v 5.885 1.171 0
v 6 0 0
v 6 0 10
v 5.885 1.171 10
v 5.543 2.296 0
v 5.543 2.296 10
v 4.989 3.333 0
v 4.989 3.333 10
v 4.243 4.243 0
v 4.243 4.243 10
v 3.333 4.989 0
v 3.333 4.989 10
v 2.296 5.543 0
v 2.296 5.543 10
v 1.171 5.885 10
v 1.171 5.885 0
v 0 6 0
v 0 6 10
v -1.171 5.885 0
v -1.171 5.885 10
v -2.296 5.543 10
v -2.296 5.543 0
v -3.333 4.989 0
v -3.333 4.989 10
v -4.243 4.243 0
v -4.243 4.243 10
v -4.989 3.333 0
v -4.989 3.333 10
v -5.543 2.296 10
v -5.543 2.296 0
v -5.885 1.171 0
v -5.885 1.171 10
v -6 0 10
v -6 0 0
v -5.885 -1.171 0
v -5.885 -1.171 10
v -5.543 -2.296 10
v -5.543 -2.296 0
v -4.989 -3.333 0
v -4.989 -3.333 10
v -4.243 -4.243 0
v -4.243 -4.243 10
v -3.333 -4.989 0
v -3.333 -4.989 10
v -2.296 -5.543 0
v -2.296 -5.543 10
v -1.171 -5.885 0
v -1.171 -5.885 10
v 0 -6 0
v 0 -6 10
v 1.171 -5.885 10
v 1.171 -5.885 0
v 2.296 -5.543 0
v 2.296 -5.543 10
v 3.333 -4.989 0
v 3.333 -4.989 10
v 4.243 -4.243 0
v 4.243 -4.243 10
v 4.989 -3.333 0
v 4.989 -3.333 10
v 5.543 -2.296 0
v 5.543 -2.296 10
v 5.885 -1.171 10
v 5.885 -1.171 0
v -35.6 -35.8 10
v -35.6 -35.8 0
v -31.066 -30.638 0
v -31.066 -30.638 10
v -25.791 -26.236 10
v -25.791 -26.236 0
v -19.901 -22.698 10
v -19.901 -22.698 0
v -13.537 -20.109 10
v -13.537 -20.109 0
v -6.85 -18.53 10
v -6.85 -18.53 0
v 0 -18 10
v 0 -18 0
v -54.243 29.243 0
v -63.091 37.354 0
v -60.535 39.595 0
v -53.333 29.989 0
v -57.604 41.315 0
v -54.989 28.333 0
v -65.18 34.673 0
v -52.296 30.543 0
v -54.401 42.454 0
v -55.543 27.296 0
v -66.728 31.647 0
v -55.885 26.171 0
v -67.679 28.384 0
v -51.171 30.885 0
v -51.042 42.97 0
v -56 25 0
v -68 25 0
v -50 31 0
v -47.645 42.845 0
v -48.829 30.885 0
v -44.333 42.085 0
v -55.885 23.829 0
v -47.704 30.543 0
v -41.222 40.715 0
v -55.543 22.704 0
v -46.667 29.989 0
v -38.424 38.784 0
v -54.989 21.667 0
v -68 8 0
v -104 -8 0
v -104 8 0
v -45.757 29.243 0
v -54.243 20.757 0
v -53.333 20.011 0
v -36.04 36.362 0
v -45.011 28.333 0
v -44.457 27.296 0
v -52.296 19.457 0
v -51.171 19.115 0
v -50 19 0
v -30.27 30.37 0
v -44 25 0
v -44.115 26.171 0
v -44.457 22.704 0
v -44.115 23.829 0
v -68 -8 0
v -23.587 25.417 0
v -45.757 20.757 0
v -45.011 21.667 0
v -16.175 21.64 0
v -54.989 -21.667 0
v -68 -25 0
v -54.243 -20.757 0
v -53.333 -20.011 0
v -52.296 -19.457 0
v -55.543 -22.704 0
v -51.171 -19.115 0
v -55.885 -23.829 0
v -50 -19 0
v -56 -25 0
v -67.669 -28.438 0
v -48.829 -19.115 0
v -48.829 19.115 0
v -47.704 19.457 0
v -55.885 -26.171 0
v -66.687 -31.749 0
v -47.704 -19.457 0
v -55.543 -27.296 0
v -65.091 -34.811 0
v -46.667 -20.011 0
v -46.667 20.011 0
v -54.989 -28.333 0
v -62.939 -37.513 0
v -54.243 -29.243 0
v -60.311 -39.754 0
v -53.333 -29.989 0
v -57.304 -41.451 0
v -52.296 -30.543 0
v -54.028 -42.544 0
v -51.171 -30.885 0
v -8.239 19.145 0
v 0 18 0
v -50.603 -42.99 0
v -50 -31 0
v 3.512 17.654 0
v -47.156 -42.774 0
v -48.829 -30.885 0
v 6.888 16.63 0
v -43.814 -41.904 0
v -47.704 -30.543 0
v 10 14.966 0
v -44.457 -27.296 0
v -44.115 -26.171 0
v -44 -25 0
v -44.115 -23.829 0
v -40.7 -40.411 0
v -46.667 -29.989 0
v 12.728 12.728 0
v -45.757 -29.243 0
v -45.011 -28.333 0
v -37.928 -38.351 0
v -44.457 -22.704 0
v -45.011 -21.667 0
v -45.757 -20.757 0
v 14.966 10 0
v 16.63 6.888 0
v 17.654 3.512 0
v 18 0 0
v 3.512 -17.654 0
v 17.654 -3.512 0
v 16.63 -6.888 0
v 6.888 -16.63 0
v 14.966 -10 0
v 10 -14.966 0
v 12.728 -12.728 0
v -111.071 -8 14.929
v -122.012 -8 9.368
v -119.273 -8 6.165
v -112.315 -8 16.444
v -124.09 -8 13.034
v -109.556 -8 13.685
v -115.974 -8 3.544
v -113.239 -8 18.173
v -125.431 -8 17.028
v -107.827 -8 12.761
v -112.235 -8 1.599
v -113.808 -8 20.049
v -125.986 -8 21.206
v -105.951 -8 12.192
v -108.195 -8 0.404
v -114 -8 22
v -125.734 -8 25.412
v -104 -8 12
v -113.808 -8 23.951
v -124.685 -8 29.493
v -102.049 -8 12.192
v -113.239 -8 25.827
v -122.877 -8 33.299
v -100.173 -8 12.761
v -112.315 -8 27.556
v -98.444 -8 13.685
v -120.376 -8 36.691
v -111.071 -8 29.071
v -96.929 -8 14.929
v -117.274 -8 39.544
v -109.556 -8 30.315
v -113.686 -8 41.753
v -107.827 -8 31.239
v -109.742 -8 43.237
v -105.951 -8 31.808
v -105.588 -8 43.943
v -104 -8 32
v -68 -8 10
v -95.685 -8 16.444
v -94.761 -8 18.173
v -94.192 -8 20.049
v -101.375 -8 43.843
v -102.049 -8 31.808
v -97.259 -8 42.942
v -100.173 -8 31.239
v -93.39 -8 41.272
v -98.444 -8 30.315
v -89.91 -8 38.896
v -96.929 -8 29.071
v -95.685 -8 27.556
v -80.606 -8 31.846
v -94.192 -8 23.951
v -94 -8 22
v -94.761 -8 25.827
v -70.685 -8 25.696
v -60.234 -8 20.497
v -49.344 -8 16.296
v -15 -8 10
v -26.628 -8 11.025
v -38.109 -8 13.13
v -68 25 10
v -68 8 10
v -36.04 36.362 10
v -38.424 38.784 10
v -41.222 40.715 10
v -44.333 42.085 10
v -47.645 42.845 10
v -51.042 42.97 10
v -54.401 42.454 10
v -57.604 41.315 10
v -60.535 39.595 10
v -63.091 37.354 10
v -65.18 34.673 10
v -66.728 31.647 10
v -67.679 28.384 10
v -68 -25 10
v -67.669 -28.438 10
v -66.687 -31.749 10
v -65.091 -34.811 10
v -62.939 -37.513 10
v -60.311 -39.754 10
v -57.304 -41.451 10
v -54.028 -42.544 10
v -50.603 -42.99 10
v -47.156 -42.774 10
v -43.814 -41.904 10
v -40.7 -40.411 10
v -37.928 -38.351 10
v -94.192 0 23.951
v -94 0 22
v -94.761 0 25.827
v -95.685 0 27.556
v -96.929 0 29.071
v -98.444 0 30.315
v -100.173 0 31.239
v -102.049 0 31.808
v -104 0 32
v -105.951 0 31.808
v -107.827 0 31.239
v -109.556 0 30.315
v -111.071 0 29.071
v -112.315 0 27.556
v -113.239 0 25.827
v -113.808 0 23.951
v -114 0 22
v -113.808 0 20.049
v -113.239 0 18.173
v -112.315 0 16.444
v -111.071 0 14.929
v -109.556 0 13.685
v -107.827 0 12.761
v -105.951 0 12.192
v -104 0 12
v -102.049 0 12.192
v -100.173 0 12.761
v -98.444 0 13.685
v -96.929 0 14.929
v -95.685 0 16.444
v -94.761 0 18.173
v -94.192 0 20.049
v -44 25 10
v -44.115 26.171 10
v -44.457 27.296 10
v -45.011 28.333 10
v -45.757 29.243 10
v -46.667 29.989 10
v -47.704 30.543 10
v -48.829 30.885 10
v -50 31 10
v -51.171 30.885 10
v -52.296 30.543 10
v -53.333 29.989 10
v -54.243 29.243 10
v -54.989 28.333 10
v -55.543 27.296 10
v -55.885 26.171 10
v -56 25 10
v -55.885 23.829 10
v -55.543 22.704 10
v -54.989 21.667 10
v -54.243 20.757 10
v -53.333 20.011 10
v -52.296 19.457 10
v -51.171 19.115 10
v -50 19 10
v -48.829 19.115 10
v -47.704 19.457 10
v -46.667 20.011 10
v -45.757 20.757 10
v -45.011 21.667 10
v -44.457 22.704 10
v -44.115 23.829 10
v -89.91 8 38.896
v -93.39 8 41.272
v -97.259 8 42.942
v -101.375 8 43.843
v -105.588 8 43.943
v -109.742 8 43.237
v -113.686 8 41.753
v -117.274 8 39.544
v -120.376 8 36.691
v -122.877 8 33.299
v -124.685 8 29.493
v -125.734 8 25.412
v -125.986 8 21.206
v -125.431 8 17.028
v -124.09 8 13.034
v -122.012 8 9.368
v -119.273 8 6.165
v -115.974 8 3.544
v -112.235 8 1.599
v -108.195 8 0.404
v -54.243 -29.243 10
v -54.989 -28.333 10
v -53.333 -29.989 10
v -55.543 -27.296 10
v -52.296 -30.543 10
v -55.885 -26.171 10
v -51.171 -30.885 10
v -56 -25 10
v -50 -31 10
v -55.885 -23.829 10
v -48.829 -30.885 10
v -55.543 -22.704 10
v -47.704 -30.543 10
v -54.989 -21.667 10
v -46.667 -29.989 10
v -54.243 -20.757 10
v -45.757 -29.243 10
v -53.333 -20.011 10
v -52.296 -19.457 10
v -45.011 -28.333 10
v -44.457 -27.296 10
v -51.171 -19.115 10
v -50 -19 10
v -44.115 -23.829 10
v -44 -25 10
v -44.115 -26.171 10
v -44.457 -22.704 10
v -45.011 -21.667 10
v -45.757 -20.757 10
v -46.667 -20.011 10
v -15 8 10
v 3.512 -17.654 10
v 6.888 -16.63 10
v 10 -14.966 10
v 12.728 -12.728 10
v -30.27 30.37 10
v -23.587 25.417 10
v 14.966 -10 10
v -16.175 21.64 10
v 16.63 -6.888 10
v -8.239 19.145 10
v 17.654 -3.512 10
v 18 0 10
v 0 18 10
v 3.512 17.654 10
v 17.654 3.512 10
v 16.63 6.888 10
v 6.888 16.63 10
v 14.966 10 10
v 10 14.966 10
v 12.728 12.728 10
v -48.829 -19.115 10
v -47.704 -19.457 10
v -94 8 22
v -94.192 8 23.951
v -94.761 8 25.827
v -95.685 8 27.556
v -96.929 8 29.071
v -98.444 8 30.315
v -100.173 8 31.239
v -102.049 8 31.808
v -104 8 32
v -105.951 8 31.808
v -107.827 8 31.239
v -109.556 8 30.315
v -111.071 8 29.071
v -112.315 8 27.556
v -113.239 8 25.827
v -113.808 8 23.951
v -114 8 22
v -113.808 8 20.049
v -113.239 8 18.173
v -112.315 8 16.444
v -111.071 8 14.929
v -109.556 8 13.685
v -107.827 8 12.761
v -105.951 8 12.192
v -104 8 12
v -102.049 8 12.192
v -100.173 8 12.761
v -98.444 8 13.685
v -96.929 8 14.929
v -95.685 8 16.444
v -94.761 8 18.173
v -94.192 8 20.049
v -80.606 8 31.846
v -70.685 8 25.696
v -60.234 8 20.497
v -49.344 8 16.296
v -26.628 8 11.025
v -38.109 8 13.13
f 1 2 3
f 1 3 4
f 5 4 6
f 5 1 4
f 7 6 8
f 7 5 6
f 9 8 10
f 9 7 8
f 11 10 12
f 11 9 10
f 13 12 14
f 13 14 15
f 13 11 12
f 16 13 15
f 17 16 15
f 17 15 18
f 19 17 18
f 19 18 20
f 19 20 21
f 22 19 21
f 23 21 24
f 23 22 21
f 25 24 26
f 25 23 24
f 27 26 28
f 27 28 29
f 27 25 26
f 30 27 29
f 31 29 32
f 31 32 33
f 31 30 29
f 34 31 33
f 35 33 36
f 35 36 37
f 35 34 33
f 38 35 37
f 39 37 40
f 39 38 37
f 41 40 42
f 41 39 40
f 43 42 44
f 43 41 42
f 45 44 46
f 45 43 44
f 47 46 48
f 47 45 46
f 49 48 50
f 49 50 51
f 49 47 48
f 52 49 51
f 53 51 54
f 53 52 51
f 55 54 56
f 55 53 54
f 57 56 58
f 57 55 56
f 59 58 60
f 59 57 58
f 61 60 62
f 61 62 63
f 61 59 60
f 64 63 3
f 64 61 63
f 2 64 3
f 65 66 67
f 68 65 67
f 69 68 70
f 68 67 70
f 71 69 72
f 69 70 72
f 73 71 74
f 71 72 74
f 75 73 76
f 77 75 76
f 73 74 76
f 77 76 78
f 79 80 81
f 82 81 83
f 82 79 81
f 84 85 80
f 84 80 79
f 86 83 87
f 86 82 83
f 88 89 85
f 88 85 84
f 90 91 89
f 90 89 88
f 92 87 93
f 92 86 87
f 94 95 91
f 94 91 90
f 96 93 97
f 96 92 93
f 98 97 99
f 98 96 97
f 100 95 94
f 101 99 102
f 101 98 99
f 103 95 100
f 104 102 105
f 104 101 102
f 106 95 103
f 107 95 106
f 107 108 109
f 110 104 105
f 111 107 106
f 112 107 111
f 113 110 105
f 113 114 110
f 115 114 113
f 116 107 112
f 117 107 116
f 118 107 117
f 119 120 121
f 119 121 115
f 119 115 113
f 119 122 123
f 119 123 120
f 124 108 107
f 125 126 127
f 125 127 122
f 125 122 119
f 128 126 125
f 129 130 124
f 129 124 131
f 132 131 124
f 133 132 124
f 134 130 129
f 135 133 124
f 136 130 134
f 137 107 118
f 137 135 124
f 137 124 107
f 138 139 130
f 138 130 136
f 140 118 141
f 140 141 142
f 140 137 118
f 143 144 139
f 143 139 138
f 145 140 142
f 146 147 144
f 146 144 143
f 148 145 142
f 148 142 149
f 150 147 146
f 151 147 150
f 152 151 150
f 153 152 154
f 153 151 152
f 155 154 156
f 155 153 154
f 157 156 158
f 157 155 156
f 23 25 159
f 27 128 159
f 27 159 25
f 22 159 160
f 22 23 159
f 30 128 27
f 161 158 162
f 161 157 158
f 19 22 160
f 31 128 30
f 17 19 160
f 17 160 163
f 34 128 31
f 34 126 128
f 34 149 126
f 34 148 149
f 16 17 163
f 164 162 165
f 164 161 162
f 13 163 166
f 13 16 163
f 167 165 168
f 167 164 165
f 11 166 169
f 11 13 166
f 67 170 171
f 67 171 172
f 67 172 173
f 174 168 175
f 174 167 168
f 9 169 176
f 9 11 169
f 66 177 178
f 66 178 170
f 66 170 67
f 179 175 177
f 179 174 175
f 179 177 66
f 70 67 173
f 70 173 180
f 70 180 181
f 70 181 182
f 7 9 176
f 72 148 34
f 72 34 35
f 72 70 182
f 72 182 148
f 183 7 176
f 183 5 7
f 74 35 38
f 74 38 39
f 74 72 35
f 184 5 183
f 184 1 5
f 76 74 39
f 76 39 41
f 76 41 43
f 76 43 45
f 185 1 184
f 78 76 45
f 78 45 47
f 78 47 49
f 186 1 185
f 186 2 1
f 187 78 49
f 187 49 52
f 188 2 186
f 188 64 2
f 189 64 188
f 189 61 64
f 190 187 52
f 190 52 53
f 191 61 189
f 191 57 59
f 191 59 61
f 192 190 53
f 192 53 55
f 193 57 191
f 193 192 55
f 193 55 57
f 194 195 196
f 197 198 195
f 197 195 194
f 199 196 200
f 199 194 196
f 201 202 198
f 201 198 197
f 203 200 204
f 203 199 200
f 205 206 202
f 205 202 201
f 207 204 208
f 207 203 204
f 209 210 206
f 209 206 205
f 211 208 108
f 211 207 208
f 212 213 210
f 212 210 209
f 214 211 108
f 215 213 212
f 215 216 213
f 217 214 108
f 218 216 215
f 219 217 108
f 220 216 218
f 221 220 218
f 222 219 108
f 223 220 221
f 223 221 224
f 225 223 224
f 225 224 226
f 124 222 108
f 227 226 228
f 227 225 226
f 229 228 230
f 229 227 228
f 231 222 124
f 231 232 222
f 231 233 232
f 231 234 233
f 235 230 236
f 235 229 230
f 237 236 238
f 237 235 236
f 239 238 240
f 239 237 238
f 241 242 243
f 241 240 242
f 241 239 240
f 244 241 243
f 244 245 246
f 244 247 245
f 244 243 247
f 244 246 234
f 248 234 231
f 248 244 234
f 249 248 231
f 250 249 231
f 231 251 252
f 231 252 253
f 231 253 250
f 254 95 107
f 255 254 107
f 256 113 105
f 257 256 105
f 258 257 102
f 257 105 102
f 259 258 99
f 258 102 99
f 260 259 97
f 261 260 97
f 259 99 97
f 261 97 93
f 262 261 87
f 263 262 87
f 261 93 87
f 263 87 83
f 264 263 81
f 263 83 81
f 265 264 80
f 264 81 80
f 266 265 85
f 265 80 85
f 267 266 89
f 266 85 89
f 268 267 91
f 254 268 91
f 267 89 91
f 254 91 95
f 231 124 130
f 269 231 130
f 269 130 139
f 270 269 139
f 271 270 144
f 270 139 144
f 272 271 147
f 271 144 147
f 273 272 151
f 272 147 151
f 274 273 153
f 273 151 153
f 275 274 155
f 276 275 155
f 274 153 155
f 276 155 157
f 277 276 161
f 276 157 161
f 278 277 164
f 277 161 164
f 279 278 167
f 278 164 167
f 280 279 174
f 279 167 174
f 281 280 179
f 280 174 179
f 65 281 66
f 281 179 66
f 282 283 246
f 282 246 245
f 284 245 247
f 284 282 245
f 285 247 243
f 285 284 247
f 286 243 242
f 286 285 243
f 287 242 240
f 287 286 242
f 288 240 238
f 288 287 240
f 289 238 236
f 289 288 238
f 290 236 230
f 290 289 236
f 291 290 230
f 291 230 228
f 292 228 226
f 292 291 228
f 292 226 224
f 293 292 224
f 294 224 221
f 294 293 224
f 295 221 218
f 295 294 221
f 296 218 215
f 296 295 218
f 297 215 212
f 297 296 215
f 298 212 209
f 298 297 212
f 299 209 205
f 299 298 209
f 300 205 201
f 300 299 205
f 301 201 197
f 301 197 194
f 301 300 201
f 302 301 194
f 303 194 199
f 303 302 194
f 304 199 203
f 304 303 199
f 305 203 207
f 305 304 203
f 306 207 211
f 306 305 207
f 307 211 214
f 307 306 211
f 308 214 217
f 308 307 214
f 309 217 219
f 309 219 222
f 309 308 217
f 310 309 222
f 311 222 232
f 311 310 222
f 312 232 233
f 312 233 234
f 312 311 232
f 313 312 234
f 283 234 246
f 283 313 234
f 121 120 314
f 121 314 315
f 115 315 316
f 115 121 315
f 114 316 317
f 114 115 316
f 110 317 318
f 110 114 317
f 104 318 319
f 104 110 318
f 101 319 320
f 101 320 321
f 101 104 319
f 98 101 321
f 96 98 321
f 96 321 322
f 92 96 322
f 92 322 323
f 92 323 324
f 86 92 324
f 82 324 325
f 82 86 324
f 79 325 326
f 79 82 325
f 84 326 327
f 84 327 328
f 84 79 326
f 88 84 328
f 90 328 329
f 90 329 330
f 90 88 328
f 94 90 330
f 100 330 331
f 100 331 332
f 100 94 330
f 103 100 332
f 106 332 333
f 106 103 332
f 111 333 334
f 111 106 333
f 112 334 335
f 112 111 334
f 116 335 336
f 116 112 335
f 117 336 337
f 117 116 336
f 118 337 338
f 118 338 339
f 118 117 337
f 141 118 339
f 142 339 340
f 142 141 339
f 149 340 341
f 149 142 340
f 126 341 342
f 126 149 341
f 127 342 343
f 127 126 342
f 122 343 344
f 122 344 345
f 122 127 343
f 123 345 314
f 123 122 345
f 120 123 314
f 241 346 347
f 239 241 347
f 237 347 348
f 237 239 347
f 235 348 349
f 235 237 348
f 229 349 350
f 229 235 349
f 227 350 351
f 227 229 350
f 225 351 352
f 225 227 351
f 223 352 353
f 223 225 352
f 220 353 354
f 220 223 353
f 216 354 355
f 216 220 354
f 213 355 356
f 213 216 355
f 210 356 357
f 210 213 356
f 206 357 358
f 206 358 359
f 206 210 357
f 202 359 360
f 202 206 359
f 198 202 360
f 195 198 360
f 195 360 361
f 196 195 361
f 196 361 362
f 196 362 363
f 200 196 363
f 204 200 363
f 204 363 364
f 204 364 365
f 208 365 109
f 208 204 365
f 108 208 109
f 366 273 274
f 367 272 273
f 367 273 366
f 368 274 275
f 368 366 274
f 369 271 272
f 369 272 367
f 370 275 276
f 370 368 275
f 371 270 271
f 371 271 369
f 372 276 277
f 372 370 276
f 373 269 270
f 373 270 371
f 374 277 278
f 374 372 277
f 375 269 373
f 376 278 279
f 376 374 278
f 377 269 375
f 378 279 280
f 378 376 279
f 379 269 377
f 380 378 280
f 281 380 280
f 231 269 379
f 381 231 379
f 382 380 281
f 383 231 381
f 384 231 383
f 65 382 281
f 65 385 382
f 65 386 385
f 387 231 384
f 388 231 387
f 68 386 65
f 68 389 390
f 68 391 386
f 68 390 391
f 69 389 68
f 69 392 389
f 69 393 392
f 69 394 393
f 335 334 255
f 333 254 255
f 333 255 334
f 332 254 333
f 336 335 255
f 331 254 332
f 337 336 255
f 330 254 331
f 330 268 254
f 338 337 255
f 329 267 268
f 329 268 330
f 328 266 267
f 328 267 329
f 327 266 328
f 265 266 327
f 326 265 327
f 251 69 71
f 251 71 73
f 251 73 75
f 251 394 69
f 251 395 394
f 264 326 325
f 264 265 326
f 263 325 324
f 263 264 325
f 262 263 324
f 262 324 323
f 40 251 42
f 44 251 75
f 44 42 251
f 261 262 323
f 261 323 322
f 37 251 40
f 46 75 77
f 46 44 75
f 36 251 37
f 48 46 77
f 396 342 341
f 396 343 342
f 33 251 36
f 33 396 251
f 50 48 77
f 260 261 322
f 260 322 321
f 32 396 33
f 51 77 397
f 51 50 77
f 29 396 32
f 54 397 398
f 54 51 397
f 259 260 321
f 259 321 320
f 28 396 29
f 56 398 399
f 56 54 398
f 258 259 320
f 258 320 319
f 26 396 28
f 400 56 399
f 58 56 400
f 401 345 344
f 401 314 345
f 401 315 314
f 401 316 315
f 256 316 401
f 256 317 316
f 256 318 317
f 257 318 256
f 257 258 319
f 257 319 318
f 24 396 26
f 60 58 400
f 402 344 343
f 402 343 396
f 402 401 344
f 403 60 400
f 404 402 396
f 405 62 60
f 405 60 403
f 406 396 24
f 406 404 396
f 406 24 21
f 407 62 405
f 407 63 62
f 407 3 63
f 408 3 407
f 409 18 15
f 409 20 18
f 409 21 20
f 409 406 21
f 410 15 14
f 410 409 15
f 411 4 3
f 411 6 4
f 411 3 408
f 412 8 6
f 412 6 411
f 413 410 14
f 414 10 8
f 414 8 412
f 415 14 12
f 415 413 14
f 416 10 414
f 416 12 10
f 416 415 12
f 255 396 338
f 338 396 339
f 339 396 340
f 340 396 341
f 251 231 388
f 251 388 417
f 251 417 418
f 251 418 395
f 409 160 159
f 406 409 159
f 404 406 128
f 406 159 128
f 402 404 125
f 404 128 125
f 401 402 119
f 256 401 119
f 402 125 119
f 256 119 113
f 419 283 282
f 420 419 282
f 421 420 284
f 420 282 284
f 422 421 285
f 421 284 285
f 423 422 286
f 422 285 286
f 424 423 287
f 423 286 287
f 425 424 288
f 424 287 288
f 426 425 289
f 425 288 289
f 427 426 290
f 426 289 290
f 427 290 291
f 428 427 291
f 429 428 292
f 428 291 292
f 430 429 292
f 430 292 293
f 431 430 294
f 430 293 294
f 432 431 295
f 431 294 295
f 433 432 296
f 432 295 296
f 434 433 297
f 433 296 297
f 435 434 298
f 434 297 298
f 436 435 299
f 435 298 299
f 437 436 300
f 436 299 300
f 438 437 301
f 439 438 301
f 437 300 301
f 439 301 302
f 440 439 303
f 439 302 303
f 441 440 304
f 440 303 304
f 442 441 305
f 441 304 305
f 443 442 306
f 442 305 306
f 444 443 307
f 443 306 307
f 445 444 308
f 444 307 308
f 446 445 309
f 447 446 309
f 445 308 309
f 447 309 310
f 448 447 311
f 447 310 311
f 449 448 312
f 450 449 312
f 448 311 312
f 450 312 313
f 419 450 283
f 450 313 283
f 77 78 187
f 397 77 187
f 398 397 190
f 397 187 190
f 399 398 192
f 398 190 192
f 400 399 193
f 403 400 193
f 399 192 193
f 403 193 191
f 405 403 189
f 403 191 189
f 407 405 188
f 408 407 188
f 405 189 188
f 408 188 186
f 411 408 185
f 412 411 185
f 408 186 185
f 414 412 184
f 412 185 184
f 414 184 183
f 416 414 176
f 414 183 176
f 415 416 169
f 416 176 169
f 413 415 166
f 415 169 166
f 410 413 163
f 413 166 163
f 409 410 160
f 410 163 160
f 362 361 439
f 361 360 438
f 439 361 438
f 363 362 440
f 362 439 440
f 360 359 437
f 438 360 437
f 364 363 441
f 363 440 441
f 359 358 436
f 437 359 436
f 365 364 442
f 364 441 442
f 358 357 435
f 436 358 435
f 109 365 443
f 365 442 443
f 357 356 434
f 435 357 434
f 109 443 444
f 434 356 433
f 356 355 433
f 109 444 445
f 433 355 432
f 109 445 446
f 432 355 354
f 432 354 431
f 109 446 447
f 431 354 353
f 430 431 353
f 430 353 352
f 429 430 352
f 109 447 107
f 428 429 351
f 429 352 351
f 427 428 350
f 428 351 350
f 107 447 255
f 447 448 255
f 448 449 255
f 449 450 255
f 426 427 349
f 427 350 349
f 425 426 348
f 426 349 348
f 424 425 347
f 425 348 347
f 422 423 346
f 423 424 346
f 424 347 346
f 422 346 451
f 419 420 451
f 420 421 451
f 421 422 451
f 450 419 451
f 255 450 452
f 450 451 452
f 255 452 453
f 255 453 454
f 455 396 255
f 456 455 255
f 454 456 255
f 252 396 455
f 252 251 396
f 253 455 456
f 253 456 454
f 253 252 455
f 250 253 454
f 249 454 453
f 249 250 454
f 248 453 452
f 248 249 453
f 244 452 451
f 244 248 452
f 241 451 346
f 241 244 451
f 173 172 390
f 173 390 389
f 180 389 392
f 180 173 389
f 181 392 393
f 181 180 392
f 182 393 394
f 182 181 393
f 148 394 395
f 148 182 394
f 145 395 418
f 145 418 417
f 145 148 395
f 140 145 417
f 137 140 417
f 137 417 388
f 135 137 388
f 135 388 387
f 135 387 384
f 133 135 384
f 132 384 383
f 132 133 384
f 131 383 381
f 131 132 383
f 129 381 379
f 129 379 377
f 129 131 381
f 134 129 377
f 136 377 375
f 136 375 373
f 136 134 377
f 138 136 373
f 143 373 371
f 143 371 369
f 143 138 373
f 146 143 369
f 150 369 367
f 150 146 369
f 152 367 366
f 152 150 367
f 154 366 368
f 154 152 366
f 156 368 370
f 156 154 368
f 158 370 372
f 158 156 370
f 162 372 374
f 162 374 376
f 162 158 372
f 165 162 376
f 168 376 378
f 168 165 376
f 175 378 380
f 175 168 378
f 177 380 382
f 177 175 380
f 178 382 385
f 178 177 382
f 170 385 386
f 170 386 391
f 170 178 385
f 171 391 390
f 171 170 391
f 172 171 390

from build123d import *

# Parameters (mm, degrees)
F0_R          = 6
F1_DEPTH      = 10
F2_R          = 10
F3_DEPTH      = 8
F3_DEPTH_BACK = 8


with BuildPart() as f1:
    # F0 (on Top) → F1 (new body)
    with BuildSketch(Plane.XY):
        with BuildLine():
            ThreePointArc((-35.6, -35.8), (-19.901005, -22.69799), (0, -18))
            ThreePointArc((0, -18), (18, 0), (0, 18))
            ThreePointArc((0, 18), (-19.959456, 23.374272), (-36.039548, 36.362472))
            ThreePointArc((-36.039548, 36.362472), (-56.029588, 41.960073), (-68, 25))
            Line((-68, 25), (-68, -25))
            ThreePointArc((-68, -25), (-55.6921, -42.076299), (-35.6, -35.8))
        make_face()
        with Locations((-50, -25)):
            Circle(F0_R, mode=Mode.SUBTRACT)
        Circle(F0_R, mode=Mode.SUBTRACT)
        with Locations((-50, 25)):
            Circle(F0_R, mode=Mode.SUBTRACT)
    extrude(amount=F1_DEPTH)

    # F2 (on Front) → F3 (join, two sides)
    with BuildSketch(Plane.XZ) as f3_sk:
        with BuildLine():
            ThreePointArc((-15, 10), (-54.838013, 18.269727), (-89.909731, 38.895689))
            ThreePointArc((-89.909731, 38.895689), (-124.684598, 29.493158), (-104, 0))
            Line((-104, 0), (-15, 0))
            Line((-15, 0), (-15, 10))
        make_face()
        with Locations((-104, 22)):
            Circle(F2_R, mode=Mode.SUBTRACT)
    extrude(amount=F3_DEPTH)
    extrude(f3_sk.sketch, amount=-F3_DEPTH_BACK)


solid = f1.part
